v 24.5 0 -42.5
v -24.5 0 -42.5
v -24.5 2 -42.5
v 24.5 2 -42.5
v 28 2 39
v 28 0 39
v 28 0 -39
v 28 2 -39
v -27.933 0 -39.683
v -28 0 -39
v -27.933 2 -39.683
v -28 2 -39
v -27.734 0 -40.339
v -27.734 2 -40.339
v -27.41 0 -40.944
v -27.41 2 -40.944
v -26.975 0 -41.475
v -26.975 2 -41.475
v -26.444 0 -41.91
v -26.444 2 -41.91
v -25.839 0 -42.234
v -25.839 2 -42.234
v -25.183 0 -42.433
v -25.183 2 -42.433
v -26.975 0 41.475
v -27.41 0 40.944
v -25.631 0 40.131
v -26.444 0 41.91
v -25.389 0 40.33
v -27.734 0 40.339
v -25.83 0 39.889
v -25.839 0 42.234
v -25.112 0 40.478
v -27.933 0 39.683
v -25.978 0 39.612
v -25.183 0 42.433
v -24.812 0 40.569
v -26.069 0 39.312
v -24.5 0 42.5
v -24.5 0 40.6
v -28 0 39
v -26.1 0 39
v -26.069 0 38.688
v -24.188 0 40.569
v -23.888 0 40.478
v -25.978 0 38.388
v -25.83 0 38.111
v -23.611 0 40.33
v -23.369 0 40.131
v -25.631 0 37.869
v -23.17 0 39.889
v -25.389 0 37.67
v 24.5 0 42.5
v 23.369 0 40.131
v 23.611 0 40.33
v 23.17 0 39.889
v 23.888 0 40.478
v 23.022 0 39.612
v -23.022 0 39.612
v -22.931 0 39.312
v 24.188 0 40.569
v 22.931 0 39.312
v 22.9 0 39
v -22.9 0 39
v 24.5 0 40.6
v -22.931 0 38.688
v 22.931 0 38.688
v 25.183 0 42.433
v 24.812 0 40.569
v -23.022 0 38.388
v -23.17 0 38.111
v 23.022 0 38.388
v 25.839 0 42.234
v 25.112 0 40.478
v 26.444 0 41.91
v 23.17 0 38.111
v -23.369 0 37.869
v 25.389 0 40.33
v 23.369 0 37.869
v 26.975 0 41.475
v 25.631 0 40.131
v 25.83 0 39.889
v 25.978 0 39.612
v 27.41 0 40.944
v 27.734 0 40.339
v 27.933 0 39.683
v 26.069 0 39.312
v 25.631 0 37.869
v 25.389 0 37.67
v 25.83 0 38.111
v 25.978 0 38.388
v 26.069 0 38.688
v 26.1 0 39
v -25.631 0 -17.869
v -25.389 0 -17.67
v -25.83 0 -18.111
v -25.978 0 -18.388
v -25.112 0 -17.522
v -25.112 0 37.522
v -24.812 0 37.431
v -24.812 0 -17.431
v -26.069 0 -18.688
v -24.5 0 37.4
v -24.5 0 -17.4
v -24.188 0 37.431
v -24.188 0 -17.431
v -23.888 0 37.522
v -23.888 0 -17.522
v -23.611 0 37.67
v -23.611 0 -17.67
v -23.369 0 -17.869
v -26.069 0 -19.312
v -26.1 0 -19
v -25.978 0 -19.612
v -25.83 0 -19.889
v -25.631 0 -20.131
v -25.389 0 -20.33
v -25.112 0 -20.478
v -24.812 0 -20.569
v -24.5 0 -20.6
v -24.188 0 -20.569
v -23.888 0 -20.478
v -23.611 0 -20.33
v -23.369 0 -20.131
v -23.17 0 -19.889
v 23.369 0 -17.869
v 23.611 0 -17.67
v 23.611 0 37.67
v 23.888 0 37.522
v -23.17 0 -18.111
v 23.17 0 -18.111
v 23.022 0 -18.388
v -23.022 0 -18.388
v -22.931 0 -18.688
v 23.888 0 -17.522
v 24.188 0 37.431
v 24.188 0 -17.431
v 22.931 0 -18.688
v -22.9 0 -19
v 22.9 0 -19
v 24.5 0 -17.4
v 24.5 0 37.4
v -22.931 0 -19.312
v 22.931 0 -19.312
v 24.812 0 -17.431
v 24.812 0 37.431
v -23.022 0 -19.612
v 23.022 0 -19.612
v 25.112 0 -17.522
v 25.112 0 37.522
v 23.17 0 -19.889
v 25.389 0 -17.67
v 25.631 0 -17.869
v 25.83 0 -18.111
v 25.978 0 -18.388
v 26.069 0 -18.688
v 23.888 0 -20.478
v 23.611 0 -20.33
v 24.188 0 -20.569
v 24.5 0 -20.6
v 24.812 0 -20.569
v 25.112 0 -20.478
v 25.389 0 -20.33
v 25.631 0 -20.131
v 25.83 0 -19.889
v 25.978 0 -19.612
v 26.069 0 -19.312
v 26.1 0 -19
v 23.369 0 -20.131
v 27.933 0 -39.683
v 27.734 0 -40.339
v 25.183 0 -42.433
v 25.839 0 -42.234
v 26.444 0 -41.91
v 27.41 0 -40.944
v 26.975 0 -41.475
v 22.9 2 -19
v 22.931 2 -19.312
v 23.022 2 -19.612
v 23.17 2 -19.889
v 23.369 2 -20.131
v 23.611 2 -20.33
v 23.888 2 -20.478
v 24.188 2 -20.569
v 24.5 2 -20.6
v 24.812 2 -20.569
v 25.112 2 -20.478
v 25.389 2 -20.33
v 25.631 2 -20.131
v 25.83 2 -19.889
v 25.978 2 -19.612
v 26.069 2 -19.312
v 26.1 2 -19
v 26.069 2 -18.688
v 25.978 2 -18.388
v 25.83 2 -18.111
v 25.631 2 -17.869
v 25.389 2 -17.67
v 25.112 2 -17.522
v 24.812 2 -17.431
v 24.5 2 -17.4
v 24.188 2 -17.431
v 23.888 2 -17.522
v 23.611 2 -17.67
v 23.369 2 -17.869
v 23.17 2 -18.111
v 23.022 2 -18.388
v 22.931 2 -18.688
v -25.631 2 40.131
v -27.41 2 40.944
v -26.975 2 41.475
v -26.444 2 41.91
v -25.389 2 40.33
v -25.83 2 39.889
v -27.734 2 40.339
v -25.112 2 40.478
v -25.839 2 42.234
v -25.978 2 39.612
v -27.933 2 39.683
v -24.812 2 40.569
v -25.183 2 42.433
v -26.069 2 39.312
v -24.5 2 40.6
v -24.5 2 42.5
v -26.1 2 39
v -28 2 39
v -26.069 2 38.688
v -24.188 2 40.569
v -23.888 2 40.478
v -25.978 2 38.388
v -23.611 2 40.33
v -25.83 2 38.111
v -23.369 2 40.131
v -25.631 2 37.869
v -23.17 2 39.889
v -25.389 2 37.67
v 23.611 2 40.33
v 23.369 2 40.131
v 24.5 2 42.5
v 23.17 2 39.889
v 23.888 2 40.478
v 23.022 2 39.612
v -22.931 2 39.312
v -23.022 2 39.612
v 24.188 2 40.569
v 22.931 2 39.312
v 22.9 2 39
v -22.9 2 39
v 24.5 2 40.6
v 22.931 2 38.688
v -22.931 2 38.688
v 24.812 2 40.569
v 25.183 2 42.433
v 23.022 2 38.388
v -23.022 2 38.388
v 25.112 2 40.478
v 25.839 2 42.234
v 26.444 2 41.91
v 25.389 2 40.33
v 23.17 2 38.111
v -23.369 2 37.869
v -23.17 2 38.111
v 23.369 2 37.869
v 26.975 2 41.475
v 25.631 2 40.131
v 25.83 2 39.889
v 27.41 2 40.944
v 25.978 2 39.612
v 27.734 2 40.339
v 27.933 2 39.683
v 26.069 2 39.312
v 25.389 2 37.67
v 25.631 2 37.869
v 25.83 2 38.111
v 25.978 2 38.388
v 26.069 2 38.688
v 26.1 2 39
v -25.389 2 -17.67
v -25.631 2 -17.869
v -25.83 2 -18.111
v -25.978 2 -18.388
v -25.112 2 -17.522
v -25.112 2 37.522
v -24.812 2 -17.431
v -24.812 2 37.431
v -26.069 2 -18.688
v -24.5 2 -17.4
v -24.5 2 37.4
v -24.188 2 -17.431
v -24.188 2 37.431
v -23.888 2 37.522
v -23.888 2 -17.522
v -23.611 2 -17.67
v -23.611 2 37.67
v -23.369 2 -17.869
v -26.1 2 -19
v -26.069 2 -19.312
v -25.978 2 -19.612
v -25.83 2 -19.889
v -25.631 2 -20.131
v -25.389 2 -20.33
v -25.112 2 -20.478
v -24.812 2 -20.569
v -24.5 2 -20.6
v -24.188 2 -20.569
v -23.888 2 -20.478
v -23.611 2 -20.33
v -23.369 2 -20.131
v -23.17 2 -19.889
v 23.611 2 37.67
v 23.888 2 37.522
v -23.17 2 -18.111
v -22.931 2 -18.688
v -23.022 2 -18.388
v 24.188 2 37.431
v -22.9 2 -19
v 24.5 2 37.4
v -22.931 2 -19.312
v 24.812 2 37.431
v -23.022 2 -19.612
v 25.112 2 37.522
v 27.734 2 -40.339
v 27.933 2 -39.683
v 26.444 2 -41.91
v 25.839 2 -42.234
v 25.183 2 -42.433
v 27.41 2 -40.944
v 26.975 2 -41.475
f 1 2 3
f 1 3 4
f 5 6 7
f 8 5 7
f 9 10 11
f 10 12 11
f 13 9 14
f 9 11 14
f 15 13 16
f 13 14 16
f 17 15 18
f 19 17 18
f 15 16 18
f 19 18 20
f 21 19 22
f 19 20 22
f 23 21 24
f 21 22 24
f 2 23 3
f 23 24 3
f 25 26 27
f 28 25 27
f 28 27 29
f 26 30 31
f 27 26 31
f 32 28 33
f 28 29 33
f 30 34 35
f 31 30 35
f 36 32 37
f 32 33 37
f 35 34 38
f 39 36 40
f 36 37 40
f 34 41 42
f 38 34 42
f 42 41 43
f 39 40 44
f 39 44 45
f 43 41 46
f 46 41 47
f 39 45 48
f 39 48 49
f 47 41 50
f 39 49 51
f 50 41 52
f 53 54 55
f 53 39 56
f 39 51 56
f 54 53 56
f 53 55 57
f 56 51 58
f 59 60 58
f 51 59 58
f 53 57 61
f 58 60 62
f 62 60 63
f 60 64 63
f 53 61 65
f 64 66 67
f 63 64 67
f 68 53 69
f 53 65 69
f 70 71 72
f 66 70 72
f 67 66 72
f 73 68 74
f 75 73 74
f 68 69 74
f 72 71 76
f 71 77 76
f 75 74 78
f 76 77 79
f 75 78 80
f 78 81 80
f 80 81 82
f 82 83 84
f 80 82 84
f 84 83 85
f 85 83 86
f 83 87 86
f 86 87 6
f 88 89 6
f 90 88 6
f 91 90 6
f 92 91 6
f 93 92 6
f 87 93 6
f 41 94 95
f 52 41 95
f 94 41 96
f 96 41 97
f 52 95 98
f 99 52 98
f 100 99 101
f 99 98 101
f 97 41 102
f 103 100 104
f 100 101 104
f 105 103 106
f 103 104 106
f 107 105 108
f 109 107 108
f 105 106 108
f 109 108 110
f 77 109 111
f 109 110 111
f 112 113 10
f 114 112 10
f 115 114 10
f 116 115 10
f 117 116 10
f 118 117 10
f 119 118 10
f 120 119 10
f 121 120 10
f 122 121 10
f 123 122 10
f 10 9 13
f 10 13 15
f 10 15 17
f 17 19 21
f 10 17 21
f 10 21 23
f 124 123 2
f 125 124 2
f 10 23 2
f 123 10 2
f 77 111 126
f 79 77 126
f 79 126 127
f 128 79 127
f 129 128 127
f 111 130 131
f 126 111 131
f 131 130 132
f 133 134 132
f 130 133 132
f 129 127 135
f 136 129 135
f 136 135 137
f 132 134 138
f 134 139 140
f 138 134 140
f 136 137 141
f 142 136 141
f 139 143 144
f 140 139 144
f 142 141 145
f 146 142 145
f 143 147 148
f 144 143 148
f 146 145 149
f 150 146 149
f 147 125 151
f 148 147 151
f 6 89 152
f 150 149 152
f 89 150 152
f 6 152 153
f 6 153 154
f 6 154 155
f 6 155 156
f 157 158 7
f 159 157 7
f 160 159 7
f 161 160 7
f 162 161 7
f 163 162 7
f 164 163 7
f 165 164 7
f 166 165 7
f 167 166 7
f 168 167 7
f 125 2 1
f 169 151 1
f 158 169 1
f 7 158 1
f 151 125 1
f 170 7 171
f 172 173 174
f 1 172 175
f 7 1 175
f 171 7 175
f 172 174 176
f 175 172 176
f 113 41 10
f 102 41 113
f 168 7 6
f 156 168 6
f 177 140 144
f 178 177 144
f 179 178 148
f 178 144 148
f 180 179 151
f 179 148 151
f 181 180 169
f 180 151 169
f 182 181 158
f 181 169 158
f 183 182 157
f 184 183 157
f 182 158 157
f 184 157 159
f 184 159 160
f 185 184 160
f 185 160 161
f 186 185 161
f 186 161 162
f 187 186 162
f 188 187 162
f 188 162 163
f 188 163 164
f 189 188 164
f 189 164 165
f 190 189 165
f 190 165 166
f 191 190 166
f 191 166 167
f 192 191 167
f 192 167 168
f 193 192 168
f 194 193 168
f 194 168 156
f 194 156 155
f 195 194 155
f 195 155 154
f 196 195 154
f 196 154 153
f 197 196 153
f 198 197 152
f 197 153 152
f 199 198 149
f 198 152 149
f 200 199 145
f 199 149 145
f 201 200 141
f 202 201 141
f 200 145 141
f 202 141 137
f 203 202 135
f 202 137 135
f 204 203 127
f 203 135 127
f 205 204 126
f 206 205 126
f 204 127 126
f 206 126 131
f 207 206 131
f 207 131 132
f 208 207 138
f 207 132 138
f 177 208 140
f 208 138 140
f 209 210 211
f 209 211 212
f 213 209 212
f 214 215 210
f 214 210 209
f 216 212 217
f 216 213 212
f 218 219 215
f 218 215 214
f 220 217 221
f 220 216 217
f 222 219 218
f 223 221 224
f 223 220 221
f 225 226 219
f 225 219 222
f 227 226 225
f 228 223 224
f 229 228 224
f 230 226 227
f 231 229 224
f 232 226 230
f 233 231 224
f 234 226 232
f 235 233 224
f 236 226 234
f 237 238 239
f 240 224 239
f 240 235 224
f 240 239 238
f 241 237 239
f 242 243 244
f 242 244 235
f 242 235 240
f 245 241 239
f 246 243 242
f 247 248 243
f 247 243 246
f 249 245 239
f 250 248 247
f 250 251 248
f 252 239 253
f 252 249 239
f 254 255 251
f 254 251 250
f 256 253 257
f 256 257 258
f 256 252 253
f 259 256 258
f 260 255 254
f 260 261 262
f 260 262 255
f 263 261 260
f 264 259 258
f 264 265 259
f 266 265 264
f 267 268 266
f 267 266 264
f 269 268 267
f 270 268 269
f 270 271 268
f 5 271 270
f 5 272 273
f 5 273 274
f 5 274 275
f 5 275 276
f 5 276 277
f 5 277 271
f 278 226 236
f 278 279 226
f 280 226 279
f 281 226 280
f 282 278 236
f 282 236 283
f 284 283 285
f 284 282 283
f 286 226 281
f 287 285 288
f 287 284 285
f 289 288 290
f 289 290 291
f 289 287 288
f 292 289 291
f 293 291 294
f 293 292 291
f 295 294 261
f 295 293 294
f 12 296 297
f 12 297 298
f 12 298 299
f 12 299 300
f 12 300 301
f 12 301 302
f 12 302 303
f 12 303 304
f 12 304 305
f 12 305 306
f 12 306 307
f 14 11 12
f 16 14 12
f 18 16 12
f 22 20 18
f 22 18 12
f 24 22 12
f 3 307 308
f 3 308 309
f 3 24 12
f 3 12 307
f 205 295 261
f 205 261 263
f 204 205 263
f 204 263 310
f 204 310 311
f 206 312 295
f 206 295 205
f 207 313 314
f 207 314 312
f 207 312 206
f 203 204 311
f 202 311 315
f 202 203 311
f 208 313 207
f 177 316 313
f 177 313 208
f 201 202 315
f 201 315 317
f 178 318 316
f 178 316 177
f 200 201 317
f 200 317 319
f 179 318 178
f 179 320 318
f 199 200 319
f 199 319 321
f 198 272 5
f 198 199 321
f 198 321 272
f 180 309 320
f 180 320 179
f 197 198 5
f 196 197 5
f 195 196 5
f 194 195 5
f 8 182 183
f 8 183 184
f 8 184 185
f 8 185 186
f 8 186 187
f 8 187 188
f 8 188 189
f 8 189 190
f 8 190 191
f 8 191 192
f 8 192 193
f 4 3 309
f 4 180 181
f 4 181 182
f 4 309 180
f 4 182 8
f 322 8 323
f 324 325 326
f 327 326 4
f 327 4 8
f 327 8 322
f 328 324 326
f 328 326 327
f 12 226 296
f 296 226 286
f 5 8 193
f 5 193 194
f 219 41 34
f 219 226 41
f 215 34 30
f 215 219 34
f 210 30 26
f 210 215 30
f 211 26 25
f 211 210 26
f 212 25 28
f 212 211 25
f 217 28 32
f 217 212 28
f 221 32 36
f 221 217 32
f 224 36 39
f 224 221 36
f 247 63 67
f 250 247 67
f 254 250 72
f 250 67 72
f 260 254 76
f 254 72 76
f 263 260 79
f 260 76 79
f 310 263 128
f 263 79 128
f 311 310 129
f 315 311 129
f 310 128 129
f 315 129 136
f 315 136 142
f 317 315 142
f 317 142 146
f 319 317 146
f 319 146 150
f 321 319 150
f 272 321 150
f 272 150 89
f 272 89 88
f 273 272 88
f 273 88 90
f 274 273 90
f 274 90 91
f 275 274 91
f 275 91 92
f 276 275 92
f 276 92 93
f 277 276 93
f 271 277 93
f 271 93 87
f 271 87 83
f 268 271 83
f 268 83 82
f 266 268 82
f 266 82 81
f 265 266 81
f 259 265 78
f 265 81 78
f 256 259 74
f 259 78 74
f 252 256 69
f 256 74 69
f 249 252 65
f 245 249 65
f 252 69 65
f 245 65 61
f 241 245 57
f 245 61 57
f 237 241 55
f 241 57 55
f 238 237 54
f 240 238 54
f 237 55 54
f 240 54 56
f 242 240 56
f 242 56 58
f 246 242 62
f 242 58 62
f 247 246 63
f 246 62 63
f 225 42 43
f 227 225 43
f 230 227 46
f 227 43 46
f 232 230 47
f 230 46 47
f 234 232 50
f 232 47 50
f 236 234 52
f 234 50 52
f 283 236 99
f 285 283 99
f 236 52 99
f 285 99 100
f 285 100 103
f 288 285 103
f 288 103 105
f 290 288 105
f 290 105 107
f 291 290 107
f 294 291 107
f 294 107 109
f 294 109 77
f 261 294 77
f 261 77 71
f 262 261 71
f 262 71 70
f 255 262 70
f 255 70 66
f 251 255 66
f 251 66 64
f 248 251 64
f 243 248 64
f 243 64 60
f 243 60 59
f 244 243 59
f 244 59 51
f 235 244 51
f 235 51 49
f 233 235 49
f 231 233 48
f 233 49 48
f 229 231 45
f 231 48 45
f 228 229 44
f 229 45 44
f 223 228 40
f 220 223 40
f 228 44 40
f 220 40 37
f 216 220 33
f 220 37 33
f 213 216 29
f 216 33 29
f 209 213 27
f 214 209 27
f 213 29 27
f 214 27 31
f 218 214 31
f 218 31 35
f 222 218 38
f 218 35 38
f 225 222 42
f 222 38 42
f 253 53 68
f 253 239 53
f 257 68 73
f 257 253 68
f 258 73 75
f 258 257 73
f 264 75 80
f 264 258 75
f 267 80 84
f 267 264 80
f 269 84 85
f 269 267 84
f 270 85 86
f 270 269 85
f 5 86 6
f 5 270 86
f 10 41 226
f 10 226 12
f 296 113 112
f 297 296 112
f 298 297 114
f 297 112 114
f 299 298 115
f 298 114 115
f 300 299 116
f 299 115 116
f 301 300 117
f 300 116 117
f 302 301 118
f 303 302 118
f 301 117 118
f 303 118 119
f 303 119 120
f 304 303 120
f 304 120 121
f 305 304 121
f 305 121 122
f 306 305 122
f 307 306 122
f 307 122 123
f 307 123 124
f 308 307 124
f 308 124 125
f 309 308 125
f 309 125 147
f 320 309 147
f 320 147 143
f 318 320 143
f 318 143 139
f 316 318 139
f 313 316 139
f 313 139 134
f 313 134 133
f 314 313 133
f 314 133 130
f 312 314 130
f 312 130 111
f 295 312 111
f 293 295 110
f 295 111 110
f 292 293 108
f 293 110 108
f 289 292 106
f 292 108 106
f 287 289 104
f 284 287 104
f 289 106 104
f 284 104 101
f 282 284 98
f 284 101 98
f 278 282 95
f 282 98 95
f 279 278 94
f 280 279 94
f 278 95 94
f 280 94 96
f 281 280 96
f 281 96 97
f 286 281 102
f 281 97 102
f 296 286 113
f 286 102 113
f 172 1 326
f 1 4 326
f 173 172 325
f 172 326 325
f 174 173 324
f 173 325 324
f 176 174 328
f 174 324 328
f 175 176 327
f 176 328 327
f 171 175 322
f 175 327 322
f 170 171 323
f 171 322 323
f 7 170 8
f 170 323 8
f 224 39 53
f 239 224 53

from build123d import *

# Parameters (mm, degrees)
SKETCH1_W                = 56
SKETCH1_H                = 85
BOSS_EXTRUDE1_DEPTH      = 2
M3_CLEARANCE_HOLE1_D     = 3.2
M3_CLEARANCE_HOLE1_DEPTH = 2
VERRUNDUNG1_R            = 3.5


with BuildPart() as part:
    # Sketch1 → Boss-Extrude1 (new body)
    with BuildSketch(Plane(origin=(0, 0, 0), x_dir=(1, 0, 0), z_dir=(0, 1, 0))):
        Rectangle(SKETCH1_W, SKETCH1_H)
    extrude(amount=BOSS_EXTRUDE1_DEPTH)

    # M3 Clearance Hole1
    with Locations(Plane(origin=(0, 2, 0), x_dir=(1, 0, 0), z_dir=(0, 1, 0))):
        with Locations((-24.5, 19), (24.5, -39), (-24.5, -39), (24.5, 19)):
            Hole(M3_CLEARANCE_HOLE1_D / 2, depth=M3_CLEARANCE_HOLE1_DEPTH)

    # Verrundung1
    verrundung1_edges = [part.edges().sort_by_distance(p)[0] for p in [
        (28, 1, 42.5),
        (-28, 1, 42.5),
        (-28, 1, -42.5),
        (28, 1, -42.5),
    ]]
    fillet(verrundung1_edges, radius=VERRUNDUNG1_R)


solid = part.part
